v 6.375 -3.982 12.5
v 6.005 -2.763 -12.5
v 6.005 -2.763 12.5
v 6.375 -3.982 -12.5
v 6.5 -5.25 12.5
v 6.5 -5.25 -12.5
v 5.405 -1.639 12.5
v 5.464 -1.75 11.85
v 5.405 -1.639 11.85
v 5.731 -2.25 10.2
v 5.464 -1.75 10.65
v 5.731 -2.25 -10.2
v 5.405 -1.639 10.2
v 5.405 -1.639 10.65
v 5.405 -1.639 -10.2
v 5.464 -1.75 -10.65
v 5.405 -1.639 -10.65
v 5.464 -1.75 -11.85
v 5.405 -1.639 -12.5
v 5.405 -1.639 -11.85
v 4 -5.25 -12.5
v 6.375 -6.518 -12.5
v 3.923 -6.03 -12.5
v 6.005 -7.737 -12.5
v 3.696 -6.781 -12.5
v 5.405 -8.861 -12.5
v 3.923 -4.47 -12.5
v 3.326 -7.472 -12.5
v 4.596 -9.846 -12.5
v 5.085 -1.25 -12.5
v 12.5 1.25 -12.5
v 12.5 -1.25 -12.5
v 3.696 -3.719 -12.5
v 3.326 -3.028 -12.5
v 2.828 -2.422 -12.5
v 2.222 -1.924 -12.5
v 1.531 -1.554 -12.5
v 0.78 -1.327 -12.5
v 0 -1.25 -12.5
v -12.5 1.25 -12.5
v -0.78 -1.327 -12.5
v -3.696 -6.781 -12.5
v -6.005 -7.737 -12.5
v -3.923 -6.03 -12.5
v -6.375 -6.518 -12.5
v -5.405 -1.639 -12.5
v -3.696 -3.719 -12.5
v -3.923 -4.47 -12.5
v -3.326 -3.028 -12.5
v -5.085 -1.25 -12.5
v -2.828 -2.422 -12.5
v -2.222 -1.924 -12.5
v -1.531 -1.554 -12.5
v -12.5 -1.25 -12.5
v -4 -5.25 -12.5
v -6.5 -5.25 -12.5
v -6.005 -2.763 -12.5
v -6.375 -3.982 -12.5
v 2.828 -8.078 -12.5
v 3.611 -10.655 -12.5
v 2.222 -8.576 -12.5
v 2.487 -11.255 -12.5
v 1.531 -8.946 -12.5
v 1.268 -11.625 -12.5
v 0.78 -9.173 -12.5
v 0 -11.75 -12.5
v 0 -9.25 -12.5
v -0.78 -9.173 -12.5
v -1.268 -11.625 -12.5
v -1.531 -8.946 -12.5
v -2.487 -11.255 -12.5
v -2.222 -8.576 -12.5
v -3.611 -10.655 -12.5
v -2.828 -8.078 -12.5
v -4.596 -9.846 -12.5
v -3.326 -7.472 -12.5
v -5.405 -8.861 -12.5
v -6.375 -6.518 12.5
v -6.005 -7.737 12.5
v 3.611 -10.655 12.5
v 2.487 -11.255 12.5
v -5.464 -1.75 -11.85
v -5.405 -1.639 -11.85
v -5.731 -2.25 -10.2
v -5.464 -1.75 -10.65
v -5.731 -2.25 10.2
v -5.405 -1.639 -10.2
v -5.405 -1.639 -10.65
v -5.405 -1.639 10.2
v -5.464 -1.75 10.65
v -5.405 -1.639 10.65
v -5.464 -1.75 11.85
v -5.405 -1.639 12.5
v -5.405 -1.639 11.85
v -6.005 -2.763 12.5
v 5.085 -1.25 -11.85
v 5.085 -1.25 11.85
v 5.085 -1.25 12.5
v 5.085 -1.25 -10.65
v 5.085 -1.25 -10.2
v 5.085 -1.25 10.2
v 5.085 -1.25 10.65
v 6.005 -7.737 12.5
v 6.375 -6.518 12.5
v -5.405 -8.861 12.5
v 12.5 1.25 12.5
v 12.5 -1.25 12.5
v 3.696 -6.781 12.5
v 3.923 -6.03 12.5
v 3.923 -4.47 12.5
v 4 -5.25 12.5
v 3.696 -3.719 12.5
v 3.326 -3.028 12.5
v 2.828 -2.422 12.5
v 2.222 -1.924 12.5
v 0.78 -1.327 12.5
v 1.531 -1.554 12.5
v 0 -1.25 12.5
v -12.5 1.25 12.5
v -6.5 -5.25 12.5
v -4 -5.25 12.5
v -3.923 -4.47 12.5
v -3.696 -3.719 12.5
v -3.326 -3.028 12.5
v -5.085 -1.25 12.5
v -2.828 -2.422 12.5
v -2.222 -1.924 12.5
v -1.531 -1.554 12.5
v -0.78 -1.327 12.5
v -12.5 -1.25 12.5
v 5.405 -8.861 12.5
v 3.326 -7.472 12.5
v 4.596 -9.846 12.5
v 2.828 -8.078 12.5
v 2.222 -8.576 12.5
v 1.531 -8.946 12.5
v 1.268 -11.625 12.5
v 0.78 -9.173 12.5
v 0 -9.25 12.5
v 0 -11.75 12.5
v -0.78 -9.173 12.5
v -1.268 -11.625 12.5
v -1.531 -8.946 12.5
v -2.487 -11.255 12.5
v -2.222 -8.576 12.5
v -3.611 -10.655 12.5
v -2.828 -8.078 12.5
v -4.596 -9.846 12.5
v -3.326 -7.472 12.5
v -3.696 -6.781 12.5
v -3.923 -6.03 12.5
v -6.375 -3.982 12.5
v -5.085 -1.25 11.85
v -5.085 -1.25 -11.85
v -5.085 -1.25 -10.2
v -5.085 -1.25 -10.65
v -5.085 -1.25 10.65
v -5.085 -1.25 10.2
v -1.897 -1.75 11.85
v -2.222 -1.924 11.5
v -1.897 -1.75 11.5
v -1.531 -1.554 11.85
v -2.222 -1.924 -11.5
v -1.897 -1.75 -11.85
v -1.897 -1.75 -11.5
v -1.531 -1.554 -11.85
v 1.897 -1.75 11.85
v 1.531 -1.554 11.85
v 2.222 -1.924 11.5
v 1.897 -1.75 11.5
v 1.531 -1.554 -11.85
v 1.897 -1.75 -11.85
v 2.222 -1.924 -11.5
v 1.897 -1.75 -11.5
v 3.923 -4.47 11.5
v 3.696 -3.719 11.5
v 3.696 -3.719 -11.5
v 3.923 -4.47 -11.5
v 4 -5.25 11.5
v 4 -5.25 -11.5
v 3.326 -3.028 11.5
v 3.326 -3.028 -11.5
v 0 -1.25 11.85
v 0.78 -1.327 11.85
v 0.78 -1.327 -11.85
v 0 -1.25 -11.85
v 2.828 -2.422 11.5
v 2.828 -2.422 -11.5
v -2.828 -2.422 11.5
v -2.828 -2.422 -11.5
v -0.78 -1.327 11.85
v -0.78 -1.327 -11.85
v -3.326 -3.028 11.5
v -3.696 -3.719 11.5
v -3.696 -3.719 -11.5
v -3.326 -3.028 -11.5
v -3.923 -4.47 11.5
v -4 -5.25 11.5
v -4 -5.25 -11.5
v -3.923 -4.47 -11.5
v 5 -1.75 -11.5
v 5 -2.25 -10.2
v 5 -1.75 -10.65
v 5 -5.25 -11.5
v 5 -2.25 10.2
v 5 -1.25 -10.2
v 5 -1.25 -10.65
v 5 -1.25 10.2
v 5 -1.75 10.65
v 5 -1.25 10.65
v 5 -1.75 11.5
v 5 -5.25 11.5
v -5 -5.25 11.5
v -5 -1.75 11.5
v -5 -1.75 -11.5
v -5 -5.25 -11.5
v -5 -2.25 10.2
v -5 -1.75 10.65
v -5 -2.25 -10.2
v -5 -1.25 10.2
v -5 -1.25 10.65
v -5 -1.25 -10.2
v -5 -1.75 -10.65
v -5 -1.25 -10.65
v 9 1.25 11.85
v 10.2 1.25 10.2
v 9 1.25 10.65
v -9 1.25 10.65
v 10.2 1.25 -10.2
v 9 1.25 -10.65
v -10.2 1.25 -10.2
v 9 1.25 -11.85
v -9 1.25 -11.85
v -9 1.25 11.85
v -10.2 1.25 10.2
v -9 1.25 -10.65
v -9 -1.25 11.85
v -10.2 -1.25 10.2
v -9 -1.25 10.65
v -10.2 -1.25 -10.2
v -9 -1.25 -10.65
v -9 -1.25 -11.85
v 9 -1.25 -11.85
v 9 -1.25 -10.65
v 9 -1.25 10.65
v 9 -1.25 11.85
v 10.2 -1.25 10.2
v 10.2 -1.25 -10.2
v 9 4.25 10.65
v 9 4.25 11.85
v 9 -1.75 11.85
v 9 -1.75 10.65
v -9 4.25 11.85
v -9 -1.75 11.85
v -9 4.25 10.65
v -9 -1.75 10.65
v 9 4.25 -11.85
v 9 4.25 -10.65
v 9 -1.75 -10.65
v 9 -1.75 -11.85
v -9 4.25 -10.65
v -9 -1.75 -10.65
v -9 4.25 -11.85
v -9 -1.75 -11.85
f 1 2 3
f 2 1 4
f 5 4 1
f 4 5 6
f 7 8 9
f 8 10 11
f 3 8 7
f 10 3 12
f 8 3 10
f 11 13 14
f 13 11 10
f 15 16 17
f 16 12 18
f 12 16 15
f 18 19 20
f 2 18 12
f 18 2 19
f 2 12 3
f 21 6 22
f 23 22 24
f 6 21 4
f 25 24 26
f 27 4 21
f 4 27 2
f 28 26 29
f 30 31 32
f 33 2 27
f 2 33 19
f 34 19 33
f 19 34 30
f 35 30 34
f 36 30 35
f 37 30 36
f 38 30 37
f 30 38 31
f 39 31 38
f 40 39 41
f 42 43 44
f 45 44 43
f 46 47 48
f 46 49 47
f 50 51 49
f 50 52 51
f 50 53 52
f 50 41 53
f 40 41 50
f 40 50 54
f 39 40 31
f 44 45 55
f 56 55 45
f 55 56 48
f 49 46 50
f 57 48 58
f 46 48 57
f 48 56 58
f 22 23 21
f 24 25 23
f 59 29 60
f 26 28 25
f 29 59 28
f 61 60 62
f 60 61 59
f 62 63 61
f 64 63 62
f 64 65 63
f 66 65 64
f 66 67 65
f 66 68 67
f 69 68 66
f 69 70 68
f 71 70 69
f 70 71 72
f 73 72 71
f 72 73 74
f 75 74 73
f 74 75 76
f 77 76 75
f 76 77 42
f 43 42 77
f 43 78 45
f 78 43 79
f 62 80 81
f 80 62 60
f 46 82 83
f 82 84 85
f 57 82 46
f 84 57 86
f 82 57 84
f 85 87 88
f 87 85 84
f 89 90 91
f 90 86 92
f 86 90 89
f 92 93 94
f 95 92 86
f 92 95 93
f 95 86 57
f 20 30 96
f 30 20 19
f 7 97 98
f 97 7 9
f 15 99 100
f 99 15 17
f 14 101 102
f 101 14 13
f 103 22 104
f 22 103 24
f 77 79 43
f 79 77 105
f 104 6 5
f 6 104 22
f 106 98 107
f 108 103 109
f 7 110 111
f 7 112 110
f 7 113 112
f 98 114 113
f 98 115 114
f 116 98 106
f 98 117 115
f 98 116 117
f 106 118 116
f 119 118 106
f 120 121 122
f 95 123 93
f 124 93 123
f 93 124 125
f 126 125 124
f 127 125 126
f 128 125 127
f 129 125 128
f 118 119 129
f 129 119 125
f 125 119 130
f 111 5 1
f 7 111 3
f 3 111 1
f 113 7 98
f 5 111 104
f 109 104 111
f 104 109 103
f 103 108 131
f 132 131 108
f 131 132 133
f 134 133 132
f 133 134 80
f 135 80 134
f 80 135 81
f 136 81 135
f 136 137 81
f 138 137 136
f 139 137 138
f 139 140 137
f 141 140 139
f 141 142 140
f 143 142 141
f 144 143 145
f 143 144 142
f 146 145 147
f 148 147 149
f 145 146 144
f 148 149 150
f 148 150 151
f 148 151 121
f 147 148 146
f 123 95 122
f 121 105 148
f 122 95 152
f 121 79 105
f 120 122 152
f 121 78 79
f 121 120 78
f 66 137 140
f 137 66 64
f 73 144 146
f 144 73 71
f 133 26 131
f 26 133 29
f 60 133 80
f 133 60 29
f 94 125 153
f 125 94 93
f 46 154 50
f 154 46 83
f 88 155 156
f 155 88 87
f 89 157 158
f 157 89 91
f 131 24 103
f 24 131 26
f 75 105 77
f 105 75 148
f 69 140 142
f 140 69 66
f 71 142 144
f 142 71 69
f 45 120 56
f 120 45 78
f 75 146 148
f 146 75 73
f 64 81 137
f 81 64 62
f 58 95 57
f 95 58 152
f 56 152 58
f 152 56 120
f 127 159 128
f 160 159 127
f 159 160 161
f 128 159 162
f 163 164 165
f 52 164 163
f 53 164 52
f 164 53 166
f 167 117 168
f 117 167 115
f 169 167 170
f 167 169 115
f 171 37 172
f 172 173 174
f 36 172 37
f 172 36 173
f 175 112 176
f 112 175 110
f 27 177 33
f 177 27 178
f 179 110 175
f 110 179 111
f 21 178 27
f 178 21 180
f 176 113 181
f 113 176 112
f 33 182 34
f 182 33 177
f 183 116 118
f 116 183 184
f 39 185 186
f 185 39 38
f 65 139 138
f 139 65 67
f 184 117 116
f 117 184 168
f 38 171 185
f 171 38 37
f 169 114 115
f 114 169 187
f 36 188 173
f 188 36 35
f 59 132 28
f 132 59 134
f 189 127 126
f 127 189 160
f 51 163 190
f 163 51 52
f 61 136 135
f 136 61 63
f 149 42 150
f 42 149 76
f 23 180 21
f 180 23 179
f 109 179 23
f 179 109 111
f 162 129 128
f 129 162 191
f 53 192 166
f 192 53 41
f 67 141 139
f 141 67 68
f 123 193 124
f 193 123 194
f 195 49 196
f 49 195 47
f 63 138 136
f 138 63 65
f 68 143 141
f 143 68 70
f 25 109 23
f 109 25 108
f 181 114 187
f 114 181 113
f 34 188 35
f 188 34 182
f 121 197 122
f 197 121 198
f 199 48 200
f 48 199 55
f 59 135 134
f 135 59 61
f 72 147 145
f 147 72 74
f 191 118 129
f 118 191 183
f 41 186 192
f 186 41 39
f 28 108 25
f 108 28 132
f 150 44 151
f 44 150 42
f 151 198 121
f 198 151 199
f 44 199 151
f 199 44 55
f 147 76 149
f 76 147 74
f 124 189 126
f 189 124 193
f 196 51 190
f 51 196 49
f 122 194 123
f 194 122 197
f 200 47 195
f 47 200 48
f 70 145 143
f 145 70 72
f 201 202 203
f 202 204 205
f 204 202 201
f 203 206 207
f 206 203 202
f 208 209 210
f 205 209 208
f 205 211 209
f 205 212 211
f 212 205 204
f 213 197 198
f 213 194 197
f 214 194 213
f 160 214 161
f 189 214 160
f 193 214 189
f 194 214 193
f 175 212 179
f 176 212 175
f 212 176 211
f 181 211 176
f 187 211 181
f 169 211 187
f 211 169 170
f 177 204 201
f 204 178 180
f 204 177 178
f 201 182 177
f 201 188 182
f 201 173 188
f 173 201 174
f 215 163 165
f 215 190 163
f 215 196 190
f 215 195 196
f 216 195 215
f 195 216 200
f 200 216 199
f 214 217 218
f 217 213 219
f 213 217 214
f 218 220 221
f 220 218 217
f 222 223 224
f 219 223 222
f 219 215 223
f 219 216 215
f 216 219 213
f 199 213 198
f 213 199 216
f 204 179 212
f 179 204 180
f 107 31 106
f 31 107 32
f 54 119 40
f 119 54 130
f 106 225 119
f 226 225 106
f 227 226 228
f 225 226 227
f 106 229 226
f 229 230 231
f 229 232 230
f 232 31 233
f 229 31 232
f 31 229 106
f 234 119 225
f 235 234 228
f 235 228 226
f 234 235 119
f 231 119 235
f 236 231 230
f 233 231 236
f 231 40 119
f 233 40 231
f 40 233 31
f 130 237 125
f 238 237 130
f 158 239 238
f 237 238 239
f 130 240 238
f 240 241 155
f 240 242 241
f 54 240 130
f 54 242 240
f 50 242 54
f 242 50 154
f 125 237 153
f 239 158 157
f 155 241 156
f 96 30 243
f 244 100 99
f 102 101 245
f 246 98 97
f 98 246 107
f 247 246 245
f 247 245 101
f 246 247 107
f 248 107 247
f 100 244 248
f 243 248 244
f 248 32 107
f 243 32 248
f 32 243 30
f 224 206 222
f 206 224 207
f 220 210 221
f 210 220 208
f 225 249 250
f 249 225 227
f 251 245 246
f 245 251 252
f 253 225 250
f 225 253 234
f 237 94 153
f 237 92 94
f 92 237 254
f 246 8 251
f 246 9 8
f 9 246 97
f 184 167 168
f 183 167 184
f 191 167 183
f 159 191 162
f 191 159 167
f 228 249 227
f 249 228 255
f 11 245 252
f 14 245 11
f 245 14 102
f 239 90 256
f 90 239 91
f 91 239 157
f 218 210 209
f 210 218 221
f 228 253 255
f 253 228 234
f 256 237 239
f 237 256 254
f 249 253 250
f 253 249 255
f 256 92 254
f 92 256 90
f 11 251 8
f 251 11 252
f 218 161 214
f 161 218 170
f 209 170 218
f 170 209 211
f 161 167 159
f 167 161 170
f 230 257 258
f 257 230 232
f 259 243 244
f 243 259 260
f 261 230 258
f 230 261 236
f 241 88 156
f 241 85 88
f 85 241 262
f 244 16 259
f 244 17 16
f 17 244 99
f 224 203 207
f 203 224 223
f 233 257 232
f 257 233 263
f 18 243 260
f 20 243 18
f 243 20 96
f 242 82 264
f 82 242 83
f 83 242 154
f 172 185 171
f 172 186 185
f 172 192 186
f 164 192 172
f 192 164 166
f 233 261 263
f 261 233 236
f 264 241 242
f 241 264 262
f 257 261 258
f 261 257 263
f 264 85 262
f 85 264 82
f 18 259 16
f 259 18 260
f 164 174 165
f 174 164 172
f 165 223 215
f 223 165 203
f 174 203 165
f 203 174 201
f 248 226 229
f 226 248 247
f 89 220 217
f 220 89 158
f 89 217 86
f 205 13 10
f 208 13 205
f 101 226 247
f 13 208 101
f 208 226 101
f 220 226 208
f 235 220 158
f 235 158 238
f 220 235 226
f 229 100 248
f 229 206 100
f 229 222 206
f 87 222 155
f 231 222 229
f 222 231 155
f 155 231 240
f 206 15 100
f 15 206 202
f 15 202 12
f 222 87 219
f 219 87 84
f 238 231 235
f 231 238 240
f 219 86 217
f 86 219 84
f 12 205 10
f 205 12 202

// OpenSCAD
// Self-Balancing Cube — Cable Guide Clip
// Snap-fit clip for 2020 aluminum extrusion
// Holds 3x motor phase wires + SPI bundle
// Print: TPU or flexible PETG for snap-fit

$fn = 32;

extrusion_w = 20.0;
clip_t      = 2.5;
channel_d   = 8;      // cable bundle diameter
arm_l       = 6;
snap_t      = 1.2;

difference() {
    union() {
        // Back plate
        cube([extrusion_w + 2*clip_t, clip_t, extrusion_w + 2*clip_t], center=true);

        // Snap arms (top and bottom)
        translate([0, clip_t/2, extrusion_w/2 + clip_t/2])
            cube([extrusion_w - 2, arm_l, snap_t], center=true);
        translate([0, clip_t/2, -extrusion_w/2 - clip_t/2])
            cube([extrusion_w - 2, arm_l, snap_t], center=true);

        // Cable channel holder
        translate([0, -(clip_t + channel_d)/2, 0])
            difference() {
                cylinder(h=extrusion_w + 2*clip_t, d=channel_d + 2*clip_t, center=true);
                cylinder(h=extrusion_w + 2*clip_t + 1, d=channel_d, center=true);
                translate([0, channel_d, 0])
                    cube([channel_d + 2, channel_d*2, extrusion_w + 3], center=true);
            }
    }

    // Extrusion slot
    cube([extrusion_w + 0.4, clip_t + 2, extrusion_w + 0.4], center=true);
}
